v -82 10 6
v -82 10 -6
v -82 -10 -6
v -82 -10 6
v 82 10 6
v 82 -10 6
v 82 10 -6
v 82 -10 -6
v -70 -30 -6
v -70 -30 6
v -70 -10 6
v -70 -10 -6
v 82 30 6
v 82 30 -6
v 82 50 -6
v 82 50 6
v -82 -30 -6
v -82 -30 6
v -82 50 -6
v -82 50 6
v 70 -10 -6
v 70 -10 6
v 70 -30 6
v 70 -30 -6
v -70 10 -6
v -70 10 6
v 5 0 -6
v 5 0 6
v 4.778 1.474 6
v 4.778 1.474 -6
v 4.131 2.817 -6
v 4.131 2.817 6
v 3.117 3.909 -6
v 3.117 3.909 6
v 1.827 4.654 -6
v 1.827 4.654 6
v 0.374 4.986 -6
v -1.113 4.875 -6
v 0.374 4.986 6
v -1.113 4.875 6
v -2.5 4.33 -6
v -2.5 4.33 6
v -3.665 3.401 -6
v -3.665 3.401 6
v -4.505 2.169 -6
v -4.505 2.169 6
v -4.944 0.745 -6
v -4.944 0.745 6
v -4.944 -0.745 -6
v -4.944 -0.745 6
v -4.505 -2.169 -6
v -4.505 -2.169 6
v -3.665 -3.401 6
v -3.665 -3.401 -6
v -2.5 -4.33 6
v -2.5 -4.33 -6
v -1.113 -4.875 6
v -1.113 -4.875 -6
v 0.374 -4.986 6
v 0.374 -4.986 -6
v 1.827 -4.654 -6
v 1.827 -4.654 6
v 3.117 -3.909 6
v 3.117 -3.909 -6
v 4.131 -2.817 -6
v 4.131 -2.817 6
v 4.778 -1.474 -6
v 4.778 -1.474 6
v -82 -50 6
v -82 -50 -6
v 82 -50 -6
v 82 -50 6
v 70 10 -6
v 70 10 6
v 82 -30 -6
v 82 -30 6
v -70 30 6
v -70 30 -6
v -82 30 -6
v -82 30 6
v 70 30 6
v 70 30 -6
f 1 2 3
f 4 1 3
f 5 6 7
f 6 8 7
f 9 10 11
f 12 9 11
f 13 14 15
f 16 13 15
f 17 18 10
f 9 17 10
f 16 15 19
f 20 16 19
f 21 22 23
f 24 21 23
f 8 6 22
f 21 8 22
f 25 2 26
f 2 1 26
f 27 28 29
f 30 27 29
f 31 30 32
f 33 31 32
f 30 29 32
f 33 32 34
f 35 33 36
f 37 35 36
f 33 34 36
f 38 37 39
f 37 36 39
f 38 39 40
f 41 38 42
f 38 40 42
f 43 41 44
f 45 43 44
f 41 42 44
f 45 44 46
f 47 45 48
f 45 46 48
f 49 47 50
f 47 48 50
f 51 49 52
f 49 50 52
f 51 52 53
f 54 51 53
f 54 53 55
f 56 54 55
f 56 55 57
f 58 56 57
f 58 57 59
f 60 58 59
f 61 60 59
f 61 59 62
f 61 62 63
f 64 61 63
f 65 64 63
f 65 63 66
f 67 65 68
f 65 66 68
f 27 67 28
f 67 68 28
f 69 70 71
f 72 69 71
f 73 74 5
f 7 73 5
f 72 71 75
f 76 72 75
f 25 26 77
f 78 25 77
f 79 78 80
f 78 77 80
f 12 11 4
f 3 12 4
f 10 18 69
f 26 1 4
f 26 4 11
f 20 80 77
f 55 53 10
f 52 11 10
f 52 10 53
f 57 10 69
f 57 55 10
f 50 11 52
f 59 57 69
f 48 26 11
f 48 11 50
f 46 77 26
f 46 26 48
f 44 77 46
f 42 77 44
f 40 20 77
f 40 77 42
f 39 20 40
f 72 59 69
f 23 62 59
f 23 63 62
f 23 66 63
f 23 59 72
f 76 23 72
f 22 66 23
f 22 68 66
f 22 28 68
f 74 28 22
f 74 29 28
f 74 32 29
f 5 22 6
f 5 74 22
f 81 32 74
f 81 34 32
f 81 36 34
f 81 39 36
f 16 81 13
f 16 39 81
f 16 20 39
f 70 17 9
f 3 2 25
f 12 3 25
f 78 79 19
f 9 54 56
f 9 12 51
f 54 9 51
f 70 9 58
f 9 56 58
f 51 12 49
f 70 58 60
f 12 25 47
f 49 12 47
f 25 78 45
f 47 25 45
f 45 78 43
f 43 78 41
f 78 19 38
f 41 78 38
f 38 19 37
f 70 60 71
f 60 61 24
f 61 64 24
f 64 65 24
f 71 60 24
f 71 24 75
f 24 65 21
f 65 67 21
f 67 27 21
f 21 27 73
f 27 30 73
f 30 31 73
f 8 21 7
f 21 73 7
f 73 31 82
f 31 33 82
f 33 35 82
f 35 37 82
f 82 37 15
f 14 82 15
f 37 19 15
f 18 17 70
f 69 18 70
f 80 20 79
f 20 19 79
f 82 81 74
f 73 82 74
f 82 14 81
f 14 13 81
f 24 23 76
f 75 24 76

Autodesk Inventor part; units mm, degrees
ref_plane "YZ Plane" through (0, 0, 0) normal (1, 0, 0) x (0, 1, 0)
ref_plane "XZ Plane" through (0, 0, 0) normal (0, 1, 0) x (-1, 0, 0)
ref_plane "XY Plane" through (0, 0, 0) normal (0, 0, 1) x (1, 0, 0)
sketch "Sketch1" plane through (0, 0, 0) normal (0, 0, 1) x (1, 0, 0)
  line L0 (-82, -50) -> (82, -50)
  line L1 (82, -50) -> (82, 50)
  line L2 (82, 50) -> (-82, 50)
  line L3 (-82, 50) -> (-82, -50)
  line L4 (-82, -50) -> (82, 50) construction
  line L5 (82, -50) -> (-82, 50) construction
  point P0 (0, 0)
  dimension "d0" = 164
  dimension "d1" = 100
extrude "Extrusion1" add sketch "Sketch1" along normal mid plane 12
sketch "Sketch2" plane through (0, 0, 6) normal (0, 0, 1) x (1, 0, 0)
  line L0 (-82, 50) -> (-82, -50) projected
  line L1 (-82, -30) -> (-70, -30)
  line L2 (-70, -30) -> (-70, -10)
  line L3 (-70, -10) -> (-82, -10)
  line L4 (-82, -10) -> (-82, -30)
  line L5 (-82, -50) -> (82, -50) projected
  line L6 (-82, 10) -> (-70, 10)
  line L7 (-70, 10) -> (-70, 30)
  line L8 (-70, 30) -> (-82, 30)
  line L9 (-82, 30) -> (-82, 10)
  point P0 (0, 0)
  dimension "d4" = 12
  dimension "d5" = 20
  dimension "d6" = 20
  dimension "d7" = 20
  dimension "d8" = 20
extrude "Extrusion2" cut sketch "Sketch2" against normal through all
mirror "Mirror1" about plane through (0, 0, 0) normal (1, 0, 0) of "Extrusion2"
sketch "Sketch5" plane through (0, 0, 6) normal (0, 0, 1) x (1, 0, 0)
  circle A0 centre (0, 0) radius 5
  dimension "d17" = 10
extrude "Extrusion4" cut sketch "Sketch5" against normal through all
properties part number "FRONT V2" material "Wood (Cherry)"
